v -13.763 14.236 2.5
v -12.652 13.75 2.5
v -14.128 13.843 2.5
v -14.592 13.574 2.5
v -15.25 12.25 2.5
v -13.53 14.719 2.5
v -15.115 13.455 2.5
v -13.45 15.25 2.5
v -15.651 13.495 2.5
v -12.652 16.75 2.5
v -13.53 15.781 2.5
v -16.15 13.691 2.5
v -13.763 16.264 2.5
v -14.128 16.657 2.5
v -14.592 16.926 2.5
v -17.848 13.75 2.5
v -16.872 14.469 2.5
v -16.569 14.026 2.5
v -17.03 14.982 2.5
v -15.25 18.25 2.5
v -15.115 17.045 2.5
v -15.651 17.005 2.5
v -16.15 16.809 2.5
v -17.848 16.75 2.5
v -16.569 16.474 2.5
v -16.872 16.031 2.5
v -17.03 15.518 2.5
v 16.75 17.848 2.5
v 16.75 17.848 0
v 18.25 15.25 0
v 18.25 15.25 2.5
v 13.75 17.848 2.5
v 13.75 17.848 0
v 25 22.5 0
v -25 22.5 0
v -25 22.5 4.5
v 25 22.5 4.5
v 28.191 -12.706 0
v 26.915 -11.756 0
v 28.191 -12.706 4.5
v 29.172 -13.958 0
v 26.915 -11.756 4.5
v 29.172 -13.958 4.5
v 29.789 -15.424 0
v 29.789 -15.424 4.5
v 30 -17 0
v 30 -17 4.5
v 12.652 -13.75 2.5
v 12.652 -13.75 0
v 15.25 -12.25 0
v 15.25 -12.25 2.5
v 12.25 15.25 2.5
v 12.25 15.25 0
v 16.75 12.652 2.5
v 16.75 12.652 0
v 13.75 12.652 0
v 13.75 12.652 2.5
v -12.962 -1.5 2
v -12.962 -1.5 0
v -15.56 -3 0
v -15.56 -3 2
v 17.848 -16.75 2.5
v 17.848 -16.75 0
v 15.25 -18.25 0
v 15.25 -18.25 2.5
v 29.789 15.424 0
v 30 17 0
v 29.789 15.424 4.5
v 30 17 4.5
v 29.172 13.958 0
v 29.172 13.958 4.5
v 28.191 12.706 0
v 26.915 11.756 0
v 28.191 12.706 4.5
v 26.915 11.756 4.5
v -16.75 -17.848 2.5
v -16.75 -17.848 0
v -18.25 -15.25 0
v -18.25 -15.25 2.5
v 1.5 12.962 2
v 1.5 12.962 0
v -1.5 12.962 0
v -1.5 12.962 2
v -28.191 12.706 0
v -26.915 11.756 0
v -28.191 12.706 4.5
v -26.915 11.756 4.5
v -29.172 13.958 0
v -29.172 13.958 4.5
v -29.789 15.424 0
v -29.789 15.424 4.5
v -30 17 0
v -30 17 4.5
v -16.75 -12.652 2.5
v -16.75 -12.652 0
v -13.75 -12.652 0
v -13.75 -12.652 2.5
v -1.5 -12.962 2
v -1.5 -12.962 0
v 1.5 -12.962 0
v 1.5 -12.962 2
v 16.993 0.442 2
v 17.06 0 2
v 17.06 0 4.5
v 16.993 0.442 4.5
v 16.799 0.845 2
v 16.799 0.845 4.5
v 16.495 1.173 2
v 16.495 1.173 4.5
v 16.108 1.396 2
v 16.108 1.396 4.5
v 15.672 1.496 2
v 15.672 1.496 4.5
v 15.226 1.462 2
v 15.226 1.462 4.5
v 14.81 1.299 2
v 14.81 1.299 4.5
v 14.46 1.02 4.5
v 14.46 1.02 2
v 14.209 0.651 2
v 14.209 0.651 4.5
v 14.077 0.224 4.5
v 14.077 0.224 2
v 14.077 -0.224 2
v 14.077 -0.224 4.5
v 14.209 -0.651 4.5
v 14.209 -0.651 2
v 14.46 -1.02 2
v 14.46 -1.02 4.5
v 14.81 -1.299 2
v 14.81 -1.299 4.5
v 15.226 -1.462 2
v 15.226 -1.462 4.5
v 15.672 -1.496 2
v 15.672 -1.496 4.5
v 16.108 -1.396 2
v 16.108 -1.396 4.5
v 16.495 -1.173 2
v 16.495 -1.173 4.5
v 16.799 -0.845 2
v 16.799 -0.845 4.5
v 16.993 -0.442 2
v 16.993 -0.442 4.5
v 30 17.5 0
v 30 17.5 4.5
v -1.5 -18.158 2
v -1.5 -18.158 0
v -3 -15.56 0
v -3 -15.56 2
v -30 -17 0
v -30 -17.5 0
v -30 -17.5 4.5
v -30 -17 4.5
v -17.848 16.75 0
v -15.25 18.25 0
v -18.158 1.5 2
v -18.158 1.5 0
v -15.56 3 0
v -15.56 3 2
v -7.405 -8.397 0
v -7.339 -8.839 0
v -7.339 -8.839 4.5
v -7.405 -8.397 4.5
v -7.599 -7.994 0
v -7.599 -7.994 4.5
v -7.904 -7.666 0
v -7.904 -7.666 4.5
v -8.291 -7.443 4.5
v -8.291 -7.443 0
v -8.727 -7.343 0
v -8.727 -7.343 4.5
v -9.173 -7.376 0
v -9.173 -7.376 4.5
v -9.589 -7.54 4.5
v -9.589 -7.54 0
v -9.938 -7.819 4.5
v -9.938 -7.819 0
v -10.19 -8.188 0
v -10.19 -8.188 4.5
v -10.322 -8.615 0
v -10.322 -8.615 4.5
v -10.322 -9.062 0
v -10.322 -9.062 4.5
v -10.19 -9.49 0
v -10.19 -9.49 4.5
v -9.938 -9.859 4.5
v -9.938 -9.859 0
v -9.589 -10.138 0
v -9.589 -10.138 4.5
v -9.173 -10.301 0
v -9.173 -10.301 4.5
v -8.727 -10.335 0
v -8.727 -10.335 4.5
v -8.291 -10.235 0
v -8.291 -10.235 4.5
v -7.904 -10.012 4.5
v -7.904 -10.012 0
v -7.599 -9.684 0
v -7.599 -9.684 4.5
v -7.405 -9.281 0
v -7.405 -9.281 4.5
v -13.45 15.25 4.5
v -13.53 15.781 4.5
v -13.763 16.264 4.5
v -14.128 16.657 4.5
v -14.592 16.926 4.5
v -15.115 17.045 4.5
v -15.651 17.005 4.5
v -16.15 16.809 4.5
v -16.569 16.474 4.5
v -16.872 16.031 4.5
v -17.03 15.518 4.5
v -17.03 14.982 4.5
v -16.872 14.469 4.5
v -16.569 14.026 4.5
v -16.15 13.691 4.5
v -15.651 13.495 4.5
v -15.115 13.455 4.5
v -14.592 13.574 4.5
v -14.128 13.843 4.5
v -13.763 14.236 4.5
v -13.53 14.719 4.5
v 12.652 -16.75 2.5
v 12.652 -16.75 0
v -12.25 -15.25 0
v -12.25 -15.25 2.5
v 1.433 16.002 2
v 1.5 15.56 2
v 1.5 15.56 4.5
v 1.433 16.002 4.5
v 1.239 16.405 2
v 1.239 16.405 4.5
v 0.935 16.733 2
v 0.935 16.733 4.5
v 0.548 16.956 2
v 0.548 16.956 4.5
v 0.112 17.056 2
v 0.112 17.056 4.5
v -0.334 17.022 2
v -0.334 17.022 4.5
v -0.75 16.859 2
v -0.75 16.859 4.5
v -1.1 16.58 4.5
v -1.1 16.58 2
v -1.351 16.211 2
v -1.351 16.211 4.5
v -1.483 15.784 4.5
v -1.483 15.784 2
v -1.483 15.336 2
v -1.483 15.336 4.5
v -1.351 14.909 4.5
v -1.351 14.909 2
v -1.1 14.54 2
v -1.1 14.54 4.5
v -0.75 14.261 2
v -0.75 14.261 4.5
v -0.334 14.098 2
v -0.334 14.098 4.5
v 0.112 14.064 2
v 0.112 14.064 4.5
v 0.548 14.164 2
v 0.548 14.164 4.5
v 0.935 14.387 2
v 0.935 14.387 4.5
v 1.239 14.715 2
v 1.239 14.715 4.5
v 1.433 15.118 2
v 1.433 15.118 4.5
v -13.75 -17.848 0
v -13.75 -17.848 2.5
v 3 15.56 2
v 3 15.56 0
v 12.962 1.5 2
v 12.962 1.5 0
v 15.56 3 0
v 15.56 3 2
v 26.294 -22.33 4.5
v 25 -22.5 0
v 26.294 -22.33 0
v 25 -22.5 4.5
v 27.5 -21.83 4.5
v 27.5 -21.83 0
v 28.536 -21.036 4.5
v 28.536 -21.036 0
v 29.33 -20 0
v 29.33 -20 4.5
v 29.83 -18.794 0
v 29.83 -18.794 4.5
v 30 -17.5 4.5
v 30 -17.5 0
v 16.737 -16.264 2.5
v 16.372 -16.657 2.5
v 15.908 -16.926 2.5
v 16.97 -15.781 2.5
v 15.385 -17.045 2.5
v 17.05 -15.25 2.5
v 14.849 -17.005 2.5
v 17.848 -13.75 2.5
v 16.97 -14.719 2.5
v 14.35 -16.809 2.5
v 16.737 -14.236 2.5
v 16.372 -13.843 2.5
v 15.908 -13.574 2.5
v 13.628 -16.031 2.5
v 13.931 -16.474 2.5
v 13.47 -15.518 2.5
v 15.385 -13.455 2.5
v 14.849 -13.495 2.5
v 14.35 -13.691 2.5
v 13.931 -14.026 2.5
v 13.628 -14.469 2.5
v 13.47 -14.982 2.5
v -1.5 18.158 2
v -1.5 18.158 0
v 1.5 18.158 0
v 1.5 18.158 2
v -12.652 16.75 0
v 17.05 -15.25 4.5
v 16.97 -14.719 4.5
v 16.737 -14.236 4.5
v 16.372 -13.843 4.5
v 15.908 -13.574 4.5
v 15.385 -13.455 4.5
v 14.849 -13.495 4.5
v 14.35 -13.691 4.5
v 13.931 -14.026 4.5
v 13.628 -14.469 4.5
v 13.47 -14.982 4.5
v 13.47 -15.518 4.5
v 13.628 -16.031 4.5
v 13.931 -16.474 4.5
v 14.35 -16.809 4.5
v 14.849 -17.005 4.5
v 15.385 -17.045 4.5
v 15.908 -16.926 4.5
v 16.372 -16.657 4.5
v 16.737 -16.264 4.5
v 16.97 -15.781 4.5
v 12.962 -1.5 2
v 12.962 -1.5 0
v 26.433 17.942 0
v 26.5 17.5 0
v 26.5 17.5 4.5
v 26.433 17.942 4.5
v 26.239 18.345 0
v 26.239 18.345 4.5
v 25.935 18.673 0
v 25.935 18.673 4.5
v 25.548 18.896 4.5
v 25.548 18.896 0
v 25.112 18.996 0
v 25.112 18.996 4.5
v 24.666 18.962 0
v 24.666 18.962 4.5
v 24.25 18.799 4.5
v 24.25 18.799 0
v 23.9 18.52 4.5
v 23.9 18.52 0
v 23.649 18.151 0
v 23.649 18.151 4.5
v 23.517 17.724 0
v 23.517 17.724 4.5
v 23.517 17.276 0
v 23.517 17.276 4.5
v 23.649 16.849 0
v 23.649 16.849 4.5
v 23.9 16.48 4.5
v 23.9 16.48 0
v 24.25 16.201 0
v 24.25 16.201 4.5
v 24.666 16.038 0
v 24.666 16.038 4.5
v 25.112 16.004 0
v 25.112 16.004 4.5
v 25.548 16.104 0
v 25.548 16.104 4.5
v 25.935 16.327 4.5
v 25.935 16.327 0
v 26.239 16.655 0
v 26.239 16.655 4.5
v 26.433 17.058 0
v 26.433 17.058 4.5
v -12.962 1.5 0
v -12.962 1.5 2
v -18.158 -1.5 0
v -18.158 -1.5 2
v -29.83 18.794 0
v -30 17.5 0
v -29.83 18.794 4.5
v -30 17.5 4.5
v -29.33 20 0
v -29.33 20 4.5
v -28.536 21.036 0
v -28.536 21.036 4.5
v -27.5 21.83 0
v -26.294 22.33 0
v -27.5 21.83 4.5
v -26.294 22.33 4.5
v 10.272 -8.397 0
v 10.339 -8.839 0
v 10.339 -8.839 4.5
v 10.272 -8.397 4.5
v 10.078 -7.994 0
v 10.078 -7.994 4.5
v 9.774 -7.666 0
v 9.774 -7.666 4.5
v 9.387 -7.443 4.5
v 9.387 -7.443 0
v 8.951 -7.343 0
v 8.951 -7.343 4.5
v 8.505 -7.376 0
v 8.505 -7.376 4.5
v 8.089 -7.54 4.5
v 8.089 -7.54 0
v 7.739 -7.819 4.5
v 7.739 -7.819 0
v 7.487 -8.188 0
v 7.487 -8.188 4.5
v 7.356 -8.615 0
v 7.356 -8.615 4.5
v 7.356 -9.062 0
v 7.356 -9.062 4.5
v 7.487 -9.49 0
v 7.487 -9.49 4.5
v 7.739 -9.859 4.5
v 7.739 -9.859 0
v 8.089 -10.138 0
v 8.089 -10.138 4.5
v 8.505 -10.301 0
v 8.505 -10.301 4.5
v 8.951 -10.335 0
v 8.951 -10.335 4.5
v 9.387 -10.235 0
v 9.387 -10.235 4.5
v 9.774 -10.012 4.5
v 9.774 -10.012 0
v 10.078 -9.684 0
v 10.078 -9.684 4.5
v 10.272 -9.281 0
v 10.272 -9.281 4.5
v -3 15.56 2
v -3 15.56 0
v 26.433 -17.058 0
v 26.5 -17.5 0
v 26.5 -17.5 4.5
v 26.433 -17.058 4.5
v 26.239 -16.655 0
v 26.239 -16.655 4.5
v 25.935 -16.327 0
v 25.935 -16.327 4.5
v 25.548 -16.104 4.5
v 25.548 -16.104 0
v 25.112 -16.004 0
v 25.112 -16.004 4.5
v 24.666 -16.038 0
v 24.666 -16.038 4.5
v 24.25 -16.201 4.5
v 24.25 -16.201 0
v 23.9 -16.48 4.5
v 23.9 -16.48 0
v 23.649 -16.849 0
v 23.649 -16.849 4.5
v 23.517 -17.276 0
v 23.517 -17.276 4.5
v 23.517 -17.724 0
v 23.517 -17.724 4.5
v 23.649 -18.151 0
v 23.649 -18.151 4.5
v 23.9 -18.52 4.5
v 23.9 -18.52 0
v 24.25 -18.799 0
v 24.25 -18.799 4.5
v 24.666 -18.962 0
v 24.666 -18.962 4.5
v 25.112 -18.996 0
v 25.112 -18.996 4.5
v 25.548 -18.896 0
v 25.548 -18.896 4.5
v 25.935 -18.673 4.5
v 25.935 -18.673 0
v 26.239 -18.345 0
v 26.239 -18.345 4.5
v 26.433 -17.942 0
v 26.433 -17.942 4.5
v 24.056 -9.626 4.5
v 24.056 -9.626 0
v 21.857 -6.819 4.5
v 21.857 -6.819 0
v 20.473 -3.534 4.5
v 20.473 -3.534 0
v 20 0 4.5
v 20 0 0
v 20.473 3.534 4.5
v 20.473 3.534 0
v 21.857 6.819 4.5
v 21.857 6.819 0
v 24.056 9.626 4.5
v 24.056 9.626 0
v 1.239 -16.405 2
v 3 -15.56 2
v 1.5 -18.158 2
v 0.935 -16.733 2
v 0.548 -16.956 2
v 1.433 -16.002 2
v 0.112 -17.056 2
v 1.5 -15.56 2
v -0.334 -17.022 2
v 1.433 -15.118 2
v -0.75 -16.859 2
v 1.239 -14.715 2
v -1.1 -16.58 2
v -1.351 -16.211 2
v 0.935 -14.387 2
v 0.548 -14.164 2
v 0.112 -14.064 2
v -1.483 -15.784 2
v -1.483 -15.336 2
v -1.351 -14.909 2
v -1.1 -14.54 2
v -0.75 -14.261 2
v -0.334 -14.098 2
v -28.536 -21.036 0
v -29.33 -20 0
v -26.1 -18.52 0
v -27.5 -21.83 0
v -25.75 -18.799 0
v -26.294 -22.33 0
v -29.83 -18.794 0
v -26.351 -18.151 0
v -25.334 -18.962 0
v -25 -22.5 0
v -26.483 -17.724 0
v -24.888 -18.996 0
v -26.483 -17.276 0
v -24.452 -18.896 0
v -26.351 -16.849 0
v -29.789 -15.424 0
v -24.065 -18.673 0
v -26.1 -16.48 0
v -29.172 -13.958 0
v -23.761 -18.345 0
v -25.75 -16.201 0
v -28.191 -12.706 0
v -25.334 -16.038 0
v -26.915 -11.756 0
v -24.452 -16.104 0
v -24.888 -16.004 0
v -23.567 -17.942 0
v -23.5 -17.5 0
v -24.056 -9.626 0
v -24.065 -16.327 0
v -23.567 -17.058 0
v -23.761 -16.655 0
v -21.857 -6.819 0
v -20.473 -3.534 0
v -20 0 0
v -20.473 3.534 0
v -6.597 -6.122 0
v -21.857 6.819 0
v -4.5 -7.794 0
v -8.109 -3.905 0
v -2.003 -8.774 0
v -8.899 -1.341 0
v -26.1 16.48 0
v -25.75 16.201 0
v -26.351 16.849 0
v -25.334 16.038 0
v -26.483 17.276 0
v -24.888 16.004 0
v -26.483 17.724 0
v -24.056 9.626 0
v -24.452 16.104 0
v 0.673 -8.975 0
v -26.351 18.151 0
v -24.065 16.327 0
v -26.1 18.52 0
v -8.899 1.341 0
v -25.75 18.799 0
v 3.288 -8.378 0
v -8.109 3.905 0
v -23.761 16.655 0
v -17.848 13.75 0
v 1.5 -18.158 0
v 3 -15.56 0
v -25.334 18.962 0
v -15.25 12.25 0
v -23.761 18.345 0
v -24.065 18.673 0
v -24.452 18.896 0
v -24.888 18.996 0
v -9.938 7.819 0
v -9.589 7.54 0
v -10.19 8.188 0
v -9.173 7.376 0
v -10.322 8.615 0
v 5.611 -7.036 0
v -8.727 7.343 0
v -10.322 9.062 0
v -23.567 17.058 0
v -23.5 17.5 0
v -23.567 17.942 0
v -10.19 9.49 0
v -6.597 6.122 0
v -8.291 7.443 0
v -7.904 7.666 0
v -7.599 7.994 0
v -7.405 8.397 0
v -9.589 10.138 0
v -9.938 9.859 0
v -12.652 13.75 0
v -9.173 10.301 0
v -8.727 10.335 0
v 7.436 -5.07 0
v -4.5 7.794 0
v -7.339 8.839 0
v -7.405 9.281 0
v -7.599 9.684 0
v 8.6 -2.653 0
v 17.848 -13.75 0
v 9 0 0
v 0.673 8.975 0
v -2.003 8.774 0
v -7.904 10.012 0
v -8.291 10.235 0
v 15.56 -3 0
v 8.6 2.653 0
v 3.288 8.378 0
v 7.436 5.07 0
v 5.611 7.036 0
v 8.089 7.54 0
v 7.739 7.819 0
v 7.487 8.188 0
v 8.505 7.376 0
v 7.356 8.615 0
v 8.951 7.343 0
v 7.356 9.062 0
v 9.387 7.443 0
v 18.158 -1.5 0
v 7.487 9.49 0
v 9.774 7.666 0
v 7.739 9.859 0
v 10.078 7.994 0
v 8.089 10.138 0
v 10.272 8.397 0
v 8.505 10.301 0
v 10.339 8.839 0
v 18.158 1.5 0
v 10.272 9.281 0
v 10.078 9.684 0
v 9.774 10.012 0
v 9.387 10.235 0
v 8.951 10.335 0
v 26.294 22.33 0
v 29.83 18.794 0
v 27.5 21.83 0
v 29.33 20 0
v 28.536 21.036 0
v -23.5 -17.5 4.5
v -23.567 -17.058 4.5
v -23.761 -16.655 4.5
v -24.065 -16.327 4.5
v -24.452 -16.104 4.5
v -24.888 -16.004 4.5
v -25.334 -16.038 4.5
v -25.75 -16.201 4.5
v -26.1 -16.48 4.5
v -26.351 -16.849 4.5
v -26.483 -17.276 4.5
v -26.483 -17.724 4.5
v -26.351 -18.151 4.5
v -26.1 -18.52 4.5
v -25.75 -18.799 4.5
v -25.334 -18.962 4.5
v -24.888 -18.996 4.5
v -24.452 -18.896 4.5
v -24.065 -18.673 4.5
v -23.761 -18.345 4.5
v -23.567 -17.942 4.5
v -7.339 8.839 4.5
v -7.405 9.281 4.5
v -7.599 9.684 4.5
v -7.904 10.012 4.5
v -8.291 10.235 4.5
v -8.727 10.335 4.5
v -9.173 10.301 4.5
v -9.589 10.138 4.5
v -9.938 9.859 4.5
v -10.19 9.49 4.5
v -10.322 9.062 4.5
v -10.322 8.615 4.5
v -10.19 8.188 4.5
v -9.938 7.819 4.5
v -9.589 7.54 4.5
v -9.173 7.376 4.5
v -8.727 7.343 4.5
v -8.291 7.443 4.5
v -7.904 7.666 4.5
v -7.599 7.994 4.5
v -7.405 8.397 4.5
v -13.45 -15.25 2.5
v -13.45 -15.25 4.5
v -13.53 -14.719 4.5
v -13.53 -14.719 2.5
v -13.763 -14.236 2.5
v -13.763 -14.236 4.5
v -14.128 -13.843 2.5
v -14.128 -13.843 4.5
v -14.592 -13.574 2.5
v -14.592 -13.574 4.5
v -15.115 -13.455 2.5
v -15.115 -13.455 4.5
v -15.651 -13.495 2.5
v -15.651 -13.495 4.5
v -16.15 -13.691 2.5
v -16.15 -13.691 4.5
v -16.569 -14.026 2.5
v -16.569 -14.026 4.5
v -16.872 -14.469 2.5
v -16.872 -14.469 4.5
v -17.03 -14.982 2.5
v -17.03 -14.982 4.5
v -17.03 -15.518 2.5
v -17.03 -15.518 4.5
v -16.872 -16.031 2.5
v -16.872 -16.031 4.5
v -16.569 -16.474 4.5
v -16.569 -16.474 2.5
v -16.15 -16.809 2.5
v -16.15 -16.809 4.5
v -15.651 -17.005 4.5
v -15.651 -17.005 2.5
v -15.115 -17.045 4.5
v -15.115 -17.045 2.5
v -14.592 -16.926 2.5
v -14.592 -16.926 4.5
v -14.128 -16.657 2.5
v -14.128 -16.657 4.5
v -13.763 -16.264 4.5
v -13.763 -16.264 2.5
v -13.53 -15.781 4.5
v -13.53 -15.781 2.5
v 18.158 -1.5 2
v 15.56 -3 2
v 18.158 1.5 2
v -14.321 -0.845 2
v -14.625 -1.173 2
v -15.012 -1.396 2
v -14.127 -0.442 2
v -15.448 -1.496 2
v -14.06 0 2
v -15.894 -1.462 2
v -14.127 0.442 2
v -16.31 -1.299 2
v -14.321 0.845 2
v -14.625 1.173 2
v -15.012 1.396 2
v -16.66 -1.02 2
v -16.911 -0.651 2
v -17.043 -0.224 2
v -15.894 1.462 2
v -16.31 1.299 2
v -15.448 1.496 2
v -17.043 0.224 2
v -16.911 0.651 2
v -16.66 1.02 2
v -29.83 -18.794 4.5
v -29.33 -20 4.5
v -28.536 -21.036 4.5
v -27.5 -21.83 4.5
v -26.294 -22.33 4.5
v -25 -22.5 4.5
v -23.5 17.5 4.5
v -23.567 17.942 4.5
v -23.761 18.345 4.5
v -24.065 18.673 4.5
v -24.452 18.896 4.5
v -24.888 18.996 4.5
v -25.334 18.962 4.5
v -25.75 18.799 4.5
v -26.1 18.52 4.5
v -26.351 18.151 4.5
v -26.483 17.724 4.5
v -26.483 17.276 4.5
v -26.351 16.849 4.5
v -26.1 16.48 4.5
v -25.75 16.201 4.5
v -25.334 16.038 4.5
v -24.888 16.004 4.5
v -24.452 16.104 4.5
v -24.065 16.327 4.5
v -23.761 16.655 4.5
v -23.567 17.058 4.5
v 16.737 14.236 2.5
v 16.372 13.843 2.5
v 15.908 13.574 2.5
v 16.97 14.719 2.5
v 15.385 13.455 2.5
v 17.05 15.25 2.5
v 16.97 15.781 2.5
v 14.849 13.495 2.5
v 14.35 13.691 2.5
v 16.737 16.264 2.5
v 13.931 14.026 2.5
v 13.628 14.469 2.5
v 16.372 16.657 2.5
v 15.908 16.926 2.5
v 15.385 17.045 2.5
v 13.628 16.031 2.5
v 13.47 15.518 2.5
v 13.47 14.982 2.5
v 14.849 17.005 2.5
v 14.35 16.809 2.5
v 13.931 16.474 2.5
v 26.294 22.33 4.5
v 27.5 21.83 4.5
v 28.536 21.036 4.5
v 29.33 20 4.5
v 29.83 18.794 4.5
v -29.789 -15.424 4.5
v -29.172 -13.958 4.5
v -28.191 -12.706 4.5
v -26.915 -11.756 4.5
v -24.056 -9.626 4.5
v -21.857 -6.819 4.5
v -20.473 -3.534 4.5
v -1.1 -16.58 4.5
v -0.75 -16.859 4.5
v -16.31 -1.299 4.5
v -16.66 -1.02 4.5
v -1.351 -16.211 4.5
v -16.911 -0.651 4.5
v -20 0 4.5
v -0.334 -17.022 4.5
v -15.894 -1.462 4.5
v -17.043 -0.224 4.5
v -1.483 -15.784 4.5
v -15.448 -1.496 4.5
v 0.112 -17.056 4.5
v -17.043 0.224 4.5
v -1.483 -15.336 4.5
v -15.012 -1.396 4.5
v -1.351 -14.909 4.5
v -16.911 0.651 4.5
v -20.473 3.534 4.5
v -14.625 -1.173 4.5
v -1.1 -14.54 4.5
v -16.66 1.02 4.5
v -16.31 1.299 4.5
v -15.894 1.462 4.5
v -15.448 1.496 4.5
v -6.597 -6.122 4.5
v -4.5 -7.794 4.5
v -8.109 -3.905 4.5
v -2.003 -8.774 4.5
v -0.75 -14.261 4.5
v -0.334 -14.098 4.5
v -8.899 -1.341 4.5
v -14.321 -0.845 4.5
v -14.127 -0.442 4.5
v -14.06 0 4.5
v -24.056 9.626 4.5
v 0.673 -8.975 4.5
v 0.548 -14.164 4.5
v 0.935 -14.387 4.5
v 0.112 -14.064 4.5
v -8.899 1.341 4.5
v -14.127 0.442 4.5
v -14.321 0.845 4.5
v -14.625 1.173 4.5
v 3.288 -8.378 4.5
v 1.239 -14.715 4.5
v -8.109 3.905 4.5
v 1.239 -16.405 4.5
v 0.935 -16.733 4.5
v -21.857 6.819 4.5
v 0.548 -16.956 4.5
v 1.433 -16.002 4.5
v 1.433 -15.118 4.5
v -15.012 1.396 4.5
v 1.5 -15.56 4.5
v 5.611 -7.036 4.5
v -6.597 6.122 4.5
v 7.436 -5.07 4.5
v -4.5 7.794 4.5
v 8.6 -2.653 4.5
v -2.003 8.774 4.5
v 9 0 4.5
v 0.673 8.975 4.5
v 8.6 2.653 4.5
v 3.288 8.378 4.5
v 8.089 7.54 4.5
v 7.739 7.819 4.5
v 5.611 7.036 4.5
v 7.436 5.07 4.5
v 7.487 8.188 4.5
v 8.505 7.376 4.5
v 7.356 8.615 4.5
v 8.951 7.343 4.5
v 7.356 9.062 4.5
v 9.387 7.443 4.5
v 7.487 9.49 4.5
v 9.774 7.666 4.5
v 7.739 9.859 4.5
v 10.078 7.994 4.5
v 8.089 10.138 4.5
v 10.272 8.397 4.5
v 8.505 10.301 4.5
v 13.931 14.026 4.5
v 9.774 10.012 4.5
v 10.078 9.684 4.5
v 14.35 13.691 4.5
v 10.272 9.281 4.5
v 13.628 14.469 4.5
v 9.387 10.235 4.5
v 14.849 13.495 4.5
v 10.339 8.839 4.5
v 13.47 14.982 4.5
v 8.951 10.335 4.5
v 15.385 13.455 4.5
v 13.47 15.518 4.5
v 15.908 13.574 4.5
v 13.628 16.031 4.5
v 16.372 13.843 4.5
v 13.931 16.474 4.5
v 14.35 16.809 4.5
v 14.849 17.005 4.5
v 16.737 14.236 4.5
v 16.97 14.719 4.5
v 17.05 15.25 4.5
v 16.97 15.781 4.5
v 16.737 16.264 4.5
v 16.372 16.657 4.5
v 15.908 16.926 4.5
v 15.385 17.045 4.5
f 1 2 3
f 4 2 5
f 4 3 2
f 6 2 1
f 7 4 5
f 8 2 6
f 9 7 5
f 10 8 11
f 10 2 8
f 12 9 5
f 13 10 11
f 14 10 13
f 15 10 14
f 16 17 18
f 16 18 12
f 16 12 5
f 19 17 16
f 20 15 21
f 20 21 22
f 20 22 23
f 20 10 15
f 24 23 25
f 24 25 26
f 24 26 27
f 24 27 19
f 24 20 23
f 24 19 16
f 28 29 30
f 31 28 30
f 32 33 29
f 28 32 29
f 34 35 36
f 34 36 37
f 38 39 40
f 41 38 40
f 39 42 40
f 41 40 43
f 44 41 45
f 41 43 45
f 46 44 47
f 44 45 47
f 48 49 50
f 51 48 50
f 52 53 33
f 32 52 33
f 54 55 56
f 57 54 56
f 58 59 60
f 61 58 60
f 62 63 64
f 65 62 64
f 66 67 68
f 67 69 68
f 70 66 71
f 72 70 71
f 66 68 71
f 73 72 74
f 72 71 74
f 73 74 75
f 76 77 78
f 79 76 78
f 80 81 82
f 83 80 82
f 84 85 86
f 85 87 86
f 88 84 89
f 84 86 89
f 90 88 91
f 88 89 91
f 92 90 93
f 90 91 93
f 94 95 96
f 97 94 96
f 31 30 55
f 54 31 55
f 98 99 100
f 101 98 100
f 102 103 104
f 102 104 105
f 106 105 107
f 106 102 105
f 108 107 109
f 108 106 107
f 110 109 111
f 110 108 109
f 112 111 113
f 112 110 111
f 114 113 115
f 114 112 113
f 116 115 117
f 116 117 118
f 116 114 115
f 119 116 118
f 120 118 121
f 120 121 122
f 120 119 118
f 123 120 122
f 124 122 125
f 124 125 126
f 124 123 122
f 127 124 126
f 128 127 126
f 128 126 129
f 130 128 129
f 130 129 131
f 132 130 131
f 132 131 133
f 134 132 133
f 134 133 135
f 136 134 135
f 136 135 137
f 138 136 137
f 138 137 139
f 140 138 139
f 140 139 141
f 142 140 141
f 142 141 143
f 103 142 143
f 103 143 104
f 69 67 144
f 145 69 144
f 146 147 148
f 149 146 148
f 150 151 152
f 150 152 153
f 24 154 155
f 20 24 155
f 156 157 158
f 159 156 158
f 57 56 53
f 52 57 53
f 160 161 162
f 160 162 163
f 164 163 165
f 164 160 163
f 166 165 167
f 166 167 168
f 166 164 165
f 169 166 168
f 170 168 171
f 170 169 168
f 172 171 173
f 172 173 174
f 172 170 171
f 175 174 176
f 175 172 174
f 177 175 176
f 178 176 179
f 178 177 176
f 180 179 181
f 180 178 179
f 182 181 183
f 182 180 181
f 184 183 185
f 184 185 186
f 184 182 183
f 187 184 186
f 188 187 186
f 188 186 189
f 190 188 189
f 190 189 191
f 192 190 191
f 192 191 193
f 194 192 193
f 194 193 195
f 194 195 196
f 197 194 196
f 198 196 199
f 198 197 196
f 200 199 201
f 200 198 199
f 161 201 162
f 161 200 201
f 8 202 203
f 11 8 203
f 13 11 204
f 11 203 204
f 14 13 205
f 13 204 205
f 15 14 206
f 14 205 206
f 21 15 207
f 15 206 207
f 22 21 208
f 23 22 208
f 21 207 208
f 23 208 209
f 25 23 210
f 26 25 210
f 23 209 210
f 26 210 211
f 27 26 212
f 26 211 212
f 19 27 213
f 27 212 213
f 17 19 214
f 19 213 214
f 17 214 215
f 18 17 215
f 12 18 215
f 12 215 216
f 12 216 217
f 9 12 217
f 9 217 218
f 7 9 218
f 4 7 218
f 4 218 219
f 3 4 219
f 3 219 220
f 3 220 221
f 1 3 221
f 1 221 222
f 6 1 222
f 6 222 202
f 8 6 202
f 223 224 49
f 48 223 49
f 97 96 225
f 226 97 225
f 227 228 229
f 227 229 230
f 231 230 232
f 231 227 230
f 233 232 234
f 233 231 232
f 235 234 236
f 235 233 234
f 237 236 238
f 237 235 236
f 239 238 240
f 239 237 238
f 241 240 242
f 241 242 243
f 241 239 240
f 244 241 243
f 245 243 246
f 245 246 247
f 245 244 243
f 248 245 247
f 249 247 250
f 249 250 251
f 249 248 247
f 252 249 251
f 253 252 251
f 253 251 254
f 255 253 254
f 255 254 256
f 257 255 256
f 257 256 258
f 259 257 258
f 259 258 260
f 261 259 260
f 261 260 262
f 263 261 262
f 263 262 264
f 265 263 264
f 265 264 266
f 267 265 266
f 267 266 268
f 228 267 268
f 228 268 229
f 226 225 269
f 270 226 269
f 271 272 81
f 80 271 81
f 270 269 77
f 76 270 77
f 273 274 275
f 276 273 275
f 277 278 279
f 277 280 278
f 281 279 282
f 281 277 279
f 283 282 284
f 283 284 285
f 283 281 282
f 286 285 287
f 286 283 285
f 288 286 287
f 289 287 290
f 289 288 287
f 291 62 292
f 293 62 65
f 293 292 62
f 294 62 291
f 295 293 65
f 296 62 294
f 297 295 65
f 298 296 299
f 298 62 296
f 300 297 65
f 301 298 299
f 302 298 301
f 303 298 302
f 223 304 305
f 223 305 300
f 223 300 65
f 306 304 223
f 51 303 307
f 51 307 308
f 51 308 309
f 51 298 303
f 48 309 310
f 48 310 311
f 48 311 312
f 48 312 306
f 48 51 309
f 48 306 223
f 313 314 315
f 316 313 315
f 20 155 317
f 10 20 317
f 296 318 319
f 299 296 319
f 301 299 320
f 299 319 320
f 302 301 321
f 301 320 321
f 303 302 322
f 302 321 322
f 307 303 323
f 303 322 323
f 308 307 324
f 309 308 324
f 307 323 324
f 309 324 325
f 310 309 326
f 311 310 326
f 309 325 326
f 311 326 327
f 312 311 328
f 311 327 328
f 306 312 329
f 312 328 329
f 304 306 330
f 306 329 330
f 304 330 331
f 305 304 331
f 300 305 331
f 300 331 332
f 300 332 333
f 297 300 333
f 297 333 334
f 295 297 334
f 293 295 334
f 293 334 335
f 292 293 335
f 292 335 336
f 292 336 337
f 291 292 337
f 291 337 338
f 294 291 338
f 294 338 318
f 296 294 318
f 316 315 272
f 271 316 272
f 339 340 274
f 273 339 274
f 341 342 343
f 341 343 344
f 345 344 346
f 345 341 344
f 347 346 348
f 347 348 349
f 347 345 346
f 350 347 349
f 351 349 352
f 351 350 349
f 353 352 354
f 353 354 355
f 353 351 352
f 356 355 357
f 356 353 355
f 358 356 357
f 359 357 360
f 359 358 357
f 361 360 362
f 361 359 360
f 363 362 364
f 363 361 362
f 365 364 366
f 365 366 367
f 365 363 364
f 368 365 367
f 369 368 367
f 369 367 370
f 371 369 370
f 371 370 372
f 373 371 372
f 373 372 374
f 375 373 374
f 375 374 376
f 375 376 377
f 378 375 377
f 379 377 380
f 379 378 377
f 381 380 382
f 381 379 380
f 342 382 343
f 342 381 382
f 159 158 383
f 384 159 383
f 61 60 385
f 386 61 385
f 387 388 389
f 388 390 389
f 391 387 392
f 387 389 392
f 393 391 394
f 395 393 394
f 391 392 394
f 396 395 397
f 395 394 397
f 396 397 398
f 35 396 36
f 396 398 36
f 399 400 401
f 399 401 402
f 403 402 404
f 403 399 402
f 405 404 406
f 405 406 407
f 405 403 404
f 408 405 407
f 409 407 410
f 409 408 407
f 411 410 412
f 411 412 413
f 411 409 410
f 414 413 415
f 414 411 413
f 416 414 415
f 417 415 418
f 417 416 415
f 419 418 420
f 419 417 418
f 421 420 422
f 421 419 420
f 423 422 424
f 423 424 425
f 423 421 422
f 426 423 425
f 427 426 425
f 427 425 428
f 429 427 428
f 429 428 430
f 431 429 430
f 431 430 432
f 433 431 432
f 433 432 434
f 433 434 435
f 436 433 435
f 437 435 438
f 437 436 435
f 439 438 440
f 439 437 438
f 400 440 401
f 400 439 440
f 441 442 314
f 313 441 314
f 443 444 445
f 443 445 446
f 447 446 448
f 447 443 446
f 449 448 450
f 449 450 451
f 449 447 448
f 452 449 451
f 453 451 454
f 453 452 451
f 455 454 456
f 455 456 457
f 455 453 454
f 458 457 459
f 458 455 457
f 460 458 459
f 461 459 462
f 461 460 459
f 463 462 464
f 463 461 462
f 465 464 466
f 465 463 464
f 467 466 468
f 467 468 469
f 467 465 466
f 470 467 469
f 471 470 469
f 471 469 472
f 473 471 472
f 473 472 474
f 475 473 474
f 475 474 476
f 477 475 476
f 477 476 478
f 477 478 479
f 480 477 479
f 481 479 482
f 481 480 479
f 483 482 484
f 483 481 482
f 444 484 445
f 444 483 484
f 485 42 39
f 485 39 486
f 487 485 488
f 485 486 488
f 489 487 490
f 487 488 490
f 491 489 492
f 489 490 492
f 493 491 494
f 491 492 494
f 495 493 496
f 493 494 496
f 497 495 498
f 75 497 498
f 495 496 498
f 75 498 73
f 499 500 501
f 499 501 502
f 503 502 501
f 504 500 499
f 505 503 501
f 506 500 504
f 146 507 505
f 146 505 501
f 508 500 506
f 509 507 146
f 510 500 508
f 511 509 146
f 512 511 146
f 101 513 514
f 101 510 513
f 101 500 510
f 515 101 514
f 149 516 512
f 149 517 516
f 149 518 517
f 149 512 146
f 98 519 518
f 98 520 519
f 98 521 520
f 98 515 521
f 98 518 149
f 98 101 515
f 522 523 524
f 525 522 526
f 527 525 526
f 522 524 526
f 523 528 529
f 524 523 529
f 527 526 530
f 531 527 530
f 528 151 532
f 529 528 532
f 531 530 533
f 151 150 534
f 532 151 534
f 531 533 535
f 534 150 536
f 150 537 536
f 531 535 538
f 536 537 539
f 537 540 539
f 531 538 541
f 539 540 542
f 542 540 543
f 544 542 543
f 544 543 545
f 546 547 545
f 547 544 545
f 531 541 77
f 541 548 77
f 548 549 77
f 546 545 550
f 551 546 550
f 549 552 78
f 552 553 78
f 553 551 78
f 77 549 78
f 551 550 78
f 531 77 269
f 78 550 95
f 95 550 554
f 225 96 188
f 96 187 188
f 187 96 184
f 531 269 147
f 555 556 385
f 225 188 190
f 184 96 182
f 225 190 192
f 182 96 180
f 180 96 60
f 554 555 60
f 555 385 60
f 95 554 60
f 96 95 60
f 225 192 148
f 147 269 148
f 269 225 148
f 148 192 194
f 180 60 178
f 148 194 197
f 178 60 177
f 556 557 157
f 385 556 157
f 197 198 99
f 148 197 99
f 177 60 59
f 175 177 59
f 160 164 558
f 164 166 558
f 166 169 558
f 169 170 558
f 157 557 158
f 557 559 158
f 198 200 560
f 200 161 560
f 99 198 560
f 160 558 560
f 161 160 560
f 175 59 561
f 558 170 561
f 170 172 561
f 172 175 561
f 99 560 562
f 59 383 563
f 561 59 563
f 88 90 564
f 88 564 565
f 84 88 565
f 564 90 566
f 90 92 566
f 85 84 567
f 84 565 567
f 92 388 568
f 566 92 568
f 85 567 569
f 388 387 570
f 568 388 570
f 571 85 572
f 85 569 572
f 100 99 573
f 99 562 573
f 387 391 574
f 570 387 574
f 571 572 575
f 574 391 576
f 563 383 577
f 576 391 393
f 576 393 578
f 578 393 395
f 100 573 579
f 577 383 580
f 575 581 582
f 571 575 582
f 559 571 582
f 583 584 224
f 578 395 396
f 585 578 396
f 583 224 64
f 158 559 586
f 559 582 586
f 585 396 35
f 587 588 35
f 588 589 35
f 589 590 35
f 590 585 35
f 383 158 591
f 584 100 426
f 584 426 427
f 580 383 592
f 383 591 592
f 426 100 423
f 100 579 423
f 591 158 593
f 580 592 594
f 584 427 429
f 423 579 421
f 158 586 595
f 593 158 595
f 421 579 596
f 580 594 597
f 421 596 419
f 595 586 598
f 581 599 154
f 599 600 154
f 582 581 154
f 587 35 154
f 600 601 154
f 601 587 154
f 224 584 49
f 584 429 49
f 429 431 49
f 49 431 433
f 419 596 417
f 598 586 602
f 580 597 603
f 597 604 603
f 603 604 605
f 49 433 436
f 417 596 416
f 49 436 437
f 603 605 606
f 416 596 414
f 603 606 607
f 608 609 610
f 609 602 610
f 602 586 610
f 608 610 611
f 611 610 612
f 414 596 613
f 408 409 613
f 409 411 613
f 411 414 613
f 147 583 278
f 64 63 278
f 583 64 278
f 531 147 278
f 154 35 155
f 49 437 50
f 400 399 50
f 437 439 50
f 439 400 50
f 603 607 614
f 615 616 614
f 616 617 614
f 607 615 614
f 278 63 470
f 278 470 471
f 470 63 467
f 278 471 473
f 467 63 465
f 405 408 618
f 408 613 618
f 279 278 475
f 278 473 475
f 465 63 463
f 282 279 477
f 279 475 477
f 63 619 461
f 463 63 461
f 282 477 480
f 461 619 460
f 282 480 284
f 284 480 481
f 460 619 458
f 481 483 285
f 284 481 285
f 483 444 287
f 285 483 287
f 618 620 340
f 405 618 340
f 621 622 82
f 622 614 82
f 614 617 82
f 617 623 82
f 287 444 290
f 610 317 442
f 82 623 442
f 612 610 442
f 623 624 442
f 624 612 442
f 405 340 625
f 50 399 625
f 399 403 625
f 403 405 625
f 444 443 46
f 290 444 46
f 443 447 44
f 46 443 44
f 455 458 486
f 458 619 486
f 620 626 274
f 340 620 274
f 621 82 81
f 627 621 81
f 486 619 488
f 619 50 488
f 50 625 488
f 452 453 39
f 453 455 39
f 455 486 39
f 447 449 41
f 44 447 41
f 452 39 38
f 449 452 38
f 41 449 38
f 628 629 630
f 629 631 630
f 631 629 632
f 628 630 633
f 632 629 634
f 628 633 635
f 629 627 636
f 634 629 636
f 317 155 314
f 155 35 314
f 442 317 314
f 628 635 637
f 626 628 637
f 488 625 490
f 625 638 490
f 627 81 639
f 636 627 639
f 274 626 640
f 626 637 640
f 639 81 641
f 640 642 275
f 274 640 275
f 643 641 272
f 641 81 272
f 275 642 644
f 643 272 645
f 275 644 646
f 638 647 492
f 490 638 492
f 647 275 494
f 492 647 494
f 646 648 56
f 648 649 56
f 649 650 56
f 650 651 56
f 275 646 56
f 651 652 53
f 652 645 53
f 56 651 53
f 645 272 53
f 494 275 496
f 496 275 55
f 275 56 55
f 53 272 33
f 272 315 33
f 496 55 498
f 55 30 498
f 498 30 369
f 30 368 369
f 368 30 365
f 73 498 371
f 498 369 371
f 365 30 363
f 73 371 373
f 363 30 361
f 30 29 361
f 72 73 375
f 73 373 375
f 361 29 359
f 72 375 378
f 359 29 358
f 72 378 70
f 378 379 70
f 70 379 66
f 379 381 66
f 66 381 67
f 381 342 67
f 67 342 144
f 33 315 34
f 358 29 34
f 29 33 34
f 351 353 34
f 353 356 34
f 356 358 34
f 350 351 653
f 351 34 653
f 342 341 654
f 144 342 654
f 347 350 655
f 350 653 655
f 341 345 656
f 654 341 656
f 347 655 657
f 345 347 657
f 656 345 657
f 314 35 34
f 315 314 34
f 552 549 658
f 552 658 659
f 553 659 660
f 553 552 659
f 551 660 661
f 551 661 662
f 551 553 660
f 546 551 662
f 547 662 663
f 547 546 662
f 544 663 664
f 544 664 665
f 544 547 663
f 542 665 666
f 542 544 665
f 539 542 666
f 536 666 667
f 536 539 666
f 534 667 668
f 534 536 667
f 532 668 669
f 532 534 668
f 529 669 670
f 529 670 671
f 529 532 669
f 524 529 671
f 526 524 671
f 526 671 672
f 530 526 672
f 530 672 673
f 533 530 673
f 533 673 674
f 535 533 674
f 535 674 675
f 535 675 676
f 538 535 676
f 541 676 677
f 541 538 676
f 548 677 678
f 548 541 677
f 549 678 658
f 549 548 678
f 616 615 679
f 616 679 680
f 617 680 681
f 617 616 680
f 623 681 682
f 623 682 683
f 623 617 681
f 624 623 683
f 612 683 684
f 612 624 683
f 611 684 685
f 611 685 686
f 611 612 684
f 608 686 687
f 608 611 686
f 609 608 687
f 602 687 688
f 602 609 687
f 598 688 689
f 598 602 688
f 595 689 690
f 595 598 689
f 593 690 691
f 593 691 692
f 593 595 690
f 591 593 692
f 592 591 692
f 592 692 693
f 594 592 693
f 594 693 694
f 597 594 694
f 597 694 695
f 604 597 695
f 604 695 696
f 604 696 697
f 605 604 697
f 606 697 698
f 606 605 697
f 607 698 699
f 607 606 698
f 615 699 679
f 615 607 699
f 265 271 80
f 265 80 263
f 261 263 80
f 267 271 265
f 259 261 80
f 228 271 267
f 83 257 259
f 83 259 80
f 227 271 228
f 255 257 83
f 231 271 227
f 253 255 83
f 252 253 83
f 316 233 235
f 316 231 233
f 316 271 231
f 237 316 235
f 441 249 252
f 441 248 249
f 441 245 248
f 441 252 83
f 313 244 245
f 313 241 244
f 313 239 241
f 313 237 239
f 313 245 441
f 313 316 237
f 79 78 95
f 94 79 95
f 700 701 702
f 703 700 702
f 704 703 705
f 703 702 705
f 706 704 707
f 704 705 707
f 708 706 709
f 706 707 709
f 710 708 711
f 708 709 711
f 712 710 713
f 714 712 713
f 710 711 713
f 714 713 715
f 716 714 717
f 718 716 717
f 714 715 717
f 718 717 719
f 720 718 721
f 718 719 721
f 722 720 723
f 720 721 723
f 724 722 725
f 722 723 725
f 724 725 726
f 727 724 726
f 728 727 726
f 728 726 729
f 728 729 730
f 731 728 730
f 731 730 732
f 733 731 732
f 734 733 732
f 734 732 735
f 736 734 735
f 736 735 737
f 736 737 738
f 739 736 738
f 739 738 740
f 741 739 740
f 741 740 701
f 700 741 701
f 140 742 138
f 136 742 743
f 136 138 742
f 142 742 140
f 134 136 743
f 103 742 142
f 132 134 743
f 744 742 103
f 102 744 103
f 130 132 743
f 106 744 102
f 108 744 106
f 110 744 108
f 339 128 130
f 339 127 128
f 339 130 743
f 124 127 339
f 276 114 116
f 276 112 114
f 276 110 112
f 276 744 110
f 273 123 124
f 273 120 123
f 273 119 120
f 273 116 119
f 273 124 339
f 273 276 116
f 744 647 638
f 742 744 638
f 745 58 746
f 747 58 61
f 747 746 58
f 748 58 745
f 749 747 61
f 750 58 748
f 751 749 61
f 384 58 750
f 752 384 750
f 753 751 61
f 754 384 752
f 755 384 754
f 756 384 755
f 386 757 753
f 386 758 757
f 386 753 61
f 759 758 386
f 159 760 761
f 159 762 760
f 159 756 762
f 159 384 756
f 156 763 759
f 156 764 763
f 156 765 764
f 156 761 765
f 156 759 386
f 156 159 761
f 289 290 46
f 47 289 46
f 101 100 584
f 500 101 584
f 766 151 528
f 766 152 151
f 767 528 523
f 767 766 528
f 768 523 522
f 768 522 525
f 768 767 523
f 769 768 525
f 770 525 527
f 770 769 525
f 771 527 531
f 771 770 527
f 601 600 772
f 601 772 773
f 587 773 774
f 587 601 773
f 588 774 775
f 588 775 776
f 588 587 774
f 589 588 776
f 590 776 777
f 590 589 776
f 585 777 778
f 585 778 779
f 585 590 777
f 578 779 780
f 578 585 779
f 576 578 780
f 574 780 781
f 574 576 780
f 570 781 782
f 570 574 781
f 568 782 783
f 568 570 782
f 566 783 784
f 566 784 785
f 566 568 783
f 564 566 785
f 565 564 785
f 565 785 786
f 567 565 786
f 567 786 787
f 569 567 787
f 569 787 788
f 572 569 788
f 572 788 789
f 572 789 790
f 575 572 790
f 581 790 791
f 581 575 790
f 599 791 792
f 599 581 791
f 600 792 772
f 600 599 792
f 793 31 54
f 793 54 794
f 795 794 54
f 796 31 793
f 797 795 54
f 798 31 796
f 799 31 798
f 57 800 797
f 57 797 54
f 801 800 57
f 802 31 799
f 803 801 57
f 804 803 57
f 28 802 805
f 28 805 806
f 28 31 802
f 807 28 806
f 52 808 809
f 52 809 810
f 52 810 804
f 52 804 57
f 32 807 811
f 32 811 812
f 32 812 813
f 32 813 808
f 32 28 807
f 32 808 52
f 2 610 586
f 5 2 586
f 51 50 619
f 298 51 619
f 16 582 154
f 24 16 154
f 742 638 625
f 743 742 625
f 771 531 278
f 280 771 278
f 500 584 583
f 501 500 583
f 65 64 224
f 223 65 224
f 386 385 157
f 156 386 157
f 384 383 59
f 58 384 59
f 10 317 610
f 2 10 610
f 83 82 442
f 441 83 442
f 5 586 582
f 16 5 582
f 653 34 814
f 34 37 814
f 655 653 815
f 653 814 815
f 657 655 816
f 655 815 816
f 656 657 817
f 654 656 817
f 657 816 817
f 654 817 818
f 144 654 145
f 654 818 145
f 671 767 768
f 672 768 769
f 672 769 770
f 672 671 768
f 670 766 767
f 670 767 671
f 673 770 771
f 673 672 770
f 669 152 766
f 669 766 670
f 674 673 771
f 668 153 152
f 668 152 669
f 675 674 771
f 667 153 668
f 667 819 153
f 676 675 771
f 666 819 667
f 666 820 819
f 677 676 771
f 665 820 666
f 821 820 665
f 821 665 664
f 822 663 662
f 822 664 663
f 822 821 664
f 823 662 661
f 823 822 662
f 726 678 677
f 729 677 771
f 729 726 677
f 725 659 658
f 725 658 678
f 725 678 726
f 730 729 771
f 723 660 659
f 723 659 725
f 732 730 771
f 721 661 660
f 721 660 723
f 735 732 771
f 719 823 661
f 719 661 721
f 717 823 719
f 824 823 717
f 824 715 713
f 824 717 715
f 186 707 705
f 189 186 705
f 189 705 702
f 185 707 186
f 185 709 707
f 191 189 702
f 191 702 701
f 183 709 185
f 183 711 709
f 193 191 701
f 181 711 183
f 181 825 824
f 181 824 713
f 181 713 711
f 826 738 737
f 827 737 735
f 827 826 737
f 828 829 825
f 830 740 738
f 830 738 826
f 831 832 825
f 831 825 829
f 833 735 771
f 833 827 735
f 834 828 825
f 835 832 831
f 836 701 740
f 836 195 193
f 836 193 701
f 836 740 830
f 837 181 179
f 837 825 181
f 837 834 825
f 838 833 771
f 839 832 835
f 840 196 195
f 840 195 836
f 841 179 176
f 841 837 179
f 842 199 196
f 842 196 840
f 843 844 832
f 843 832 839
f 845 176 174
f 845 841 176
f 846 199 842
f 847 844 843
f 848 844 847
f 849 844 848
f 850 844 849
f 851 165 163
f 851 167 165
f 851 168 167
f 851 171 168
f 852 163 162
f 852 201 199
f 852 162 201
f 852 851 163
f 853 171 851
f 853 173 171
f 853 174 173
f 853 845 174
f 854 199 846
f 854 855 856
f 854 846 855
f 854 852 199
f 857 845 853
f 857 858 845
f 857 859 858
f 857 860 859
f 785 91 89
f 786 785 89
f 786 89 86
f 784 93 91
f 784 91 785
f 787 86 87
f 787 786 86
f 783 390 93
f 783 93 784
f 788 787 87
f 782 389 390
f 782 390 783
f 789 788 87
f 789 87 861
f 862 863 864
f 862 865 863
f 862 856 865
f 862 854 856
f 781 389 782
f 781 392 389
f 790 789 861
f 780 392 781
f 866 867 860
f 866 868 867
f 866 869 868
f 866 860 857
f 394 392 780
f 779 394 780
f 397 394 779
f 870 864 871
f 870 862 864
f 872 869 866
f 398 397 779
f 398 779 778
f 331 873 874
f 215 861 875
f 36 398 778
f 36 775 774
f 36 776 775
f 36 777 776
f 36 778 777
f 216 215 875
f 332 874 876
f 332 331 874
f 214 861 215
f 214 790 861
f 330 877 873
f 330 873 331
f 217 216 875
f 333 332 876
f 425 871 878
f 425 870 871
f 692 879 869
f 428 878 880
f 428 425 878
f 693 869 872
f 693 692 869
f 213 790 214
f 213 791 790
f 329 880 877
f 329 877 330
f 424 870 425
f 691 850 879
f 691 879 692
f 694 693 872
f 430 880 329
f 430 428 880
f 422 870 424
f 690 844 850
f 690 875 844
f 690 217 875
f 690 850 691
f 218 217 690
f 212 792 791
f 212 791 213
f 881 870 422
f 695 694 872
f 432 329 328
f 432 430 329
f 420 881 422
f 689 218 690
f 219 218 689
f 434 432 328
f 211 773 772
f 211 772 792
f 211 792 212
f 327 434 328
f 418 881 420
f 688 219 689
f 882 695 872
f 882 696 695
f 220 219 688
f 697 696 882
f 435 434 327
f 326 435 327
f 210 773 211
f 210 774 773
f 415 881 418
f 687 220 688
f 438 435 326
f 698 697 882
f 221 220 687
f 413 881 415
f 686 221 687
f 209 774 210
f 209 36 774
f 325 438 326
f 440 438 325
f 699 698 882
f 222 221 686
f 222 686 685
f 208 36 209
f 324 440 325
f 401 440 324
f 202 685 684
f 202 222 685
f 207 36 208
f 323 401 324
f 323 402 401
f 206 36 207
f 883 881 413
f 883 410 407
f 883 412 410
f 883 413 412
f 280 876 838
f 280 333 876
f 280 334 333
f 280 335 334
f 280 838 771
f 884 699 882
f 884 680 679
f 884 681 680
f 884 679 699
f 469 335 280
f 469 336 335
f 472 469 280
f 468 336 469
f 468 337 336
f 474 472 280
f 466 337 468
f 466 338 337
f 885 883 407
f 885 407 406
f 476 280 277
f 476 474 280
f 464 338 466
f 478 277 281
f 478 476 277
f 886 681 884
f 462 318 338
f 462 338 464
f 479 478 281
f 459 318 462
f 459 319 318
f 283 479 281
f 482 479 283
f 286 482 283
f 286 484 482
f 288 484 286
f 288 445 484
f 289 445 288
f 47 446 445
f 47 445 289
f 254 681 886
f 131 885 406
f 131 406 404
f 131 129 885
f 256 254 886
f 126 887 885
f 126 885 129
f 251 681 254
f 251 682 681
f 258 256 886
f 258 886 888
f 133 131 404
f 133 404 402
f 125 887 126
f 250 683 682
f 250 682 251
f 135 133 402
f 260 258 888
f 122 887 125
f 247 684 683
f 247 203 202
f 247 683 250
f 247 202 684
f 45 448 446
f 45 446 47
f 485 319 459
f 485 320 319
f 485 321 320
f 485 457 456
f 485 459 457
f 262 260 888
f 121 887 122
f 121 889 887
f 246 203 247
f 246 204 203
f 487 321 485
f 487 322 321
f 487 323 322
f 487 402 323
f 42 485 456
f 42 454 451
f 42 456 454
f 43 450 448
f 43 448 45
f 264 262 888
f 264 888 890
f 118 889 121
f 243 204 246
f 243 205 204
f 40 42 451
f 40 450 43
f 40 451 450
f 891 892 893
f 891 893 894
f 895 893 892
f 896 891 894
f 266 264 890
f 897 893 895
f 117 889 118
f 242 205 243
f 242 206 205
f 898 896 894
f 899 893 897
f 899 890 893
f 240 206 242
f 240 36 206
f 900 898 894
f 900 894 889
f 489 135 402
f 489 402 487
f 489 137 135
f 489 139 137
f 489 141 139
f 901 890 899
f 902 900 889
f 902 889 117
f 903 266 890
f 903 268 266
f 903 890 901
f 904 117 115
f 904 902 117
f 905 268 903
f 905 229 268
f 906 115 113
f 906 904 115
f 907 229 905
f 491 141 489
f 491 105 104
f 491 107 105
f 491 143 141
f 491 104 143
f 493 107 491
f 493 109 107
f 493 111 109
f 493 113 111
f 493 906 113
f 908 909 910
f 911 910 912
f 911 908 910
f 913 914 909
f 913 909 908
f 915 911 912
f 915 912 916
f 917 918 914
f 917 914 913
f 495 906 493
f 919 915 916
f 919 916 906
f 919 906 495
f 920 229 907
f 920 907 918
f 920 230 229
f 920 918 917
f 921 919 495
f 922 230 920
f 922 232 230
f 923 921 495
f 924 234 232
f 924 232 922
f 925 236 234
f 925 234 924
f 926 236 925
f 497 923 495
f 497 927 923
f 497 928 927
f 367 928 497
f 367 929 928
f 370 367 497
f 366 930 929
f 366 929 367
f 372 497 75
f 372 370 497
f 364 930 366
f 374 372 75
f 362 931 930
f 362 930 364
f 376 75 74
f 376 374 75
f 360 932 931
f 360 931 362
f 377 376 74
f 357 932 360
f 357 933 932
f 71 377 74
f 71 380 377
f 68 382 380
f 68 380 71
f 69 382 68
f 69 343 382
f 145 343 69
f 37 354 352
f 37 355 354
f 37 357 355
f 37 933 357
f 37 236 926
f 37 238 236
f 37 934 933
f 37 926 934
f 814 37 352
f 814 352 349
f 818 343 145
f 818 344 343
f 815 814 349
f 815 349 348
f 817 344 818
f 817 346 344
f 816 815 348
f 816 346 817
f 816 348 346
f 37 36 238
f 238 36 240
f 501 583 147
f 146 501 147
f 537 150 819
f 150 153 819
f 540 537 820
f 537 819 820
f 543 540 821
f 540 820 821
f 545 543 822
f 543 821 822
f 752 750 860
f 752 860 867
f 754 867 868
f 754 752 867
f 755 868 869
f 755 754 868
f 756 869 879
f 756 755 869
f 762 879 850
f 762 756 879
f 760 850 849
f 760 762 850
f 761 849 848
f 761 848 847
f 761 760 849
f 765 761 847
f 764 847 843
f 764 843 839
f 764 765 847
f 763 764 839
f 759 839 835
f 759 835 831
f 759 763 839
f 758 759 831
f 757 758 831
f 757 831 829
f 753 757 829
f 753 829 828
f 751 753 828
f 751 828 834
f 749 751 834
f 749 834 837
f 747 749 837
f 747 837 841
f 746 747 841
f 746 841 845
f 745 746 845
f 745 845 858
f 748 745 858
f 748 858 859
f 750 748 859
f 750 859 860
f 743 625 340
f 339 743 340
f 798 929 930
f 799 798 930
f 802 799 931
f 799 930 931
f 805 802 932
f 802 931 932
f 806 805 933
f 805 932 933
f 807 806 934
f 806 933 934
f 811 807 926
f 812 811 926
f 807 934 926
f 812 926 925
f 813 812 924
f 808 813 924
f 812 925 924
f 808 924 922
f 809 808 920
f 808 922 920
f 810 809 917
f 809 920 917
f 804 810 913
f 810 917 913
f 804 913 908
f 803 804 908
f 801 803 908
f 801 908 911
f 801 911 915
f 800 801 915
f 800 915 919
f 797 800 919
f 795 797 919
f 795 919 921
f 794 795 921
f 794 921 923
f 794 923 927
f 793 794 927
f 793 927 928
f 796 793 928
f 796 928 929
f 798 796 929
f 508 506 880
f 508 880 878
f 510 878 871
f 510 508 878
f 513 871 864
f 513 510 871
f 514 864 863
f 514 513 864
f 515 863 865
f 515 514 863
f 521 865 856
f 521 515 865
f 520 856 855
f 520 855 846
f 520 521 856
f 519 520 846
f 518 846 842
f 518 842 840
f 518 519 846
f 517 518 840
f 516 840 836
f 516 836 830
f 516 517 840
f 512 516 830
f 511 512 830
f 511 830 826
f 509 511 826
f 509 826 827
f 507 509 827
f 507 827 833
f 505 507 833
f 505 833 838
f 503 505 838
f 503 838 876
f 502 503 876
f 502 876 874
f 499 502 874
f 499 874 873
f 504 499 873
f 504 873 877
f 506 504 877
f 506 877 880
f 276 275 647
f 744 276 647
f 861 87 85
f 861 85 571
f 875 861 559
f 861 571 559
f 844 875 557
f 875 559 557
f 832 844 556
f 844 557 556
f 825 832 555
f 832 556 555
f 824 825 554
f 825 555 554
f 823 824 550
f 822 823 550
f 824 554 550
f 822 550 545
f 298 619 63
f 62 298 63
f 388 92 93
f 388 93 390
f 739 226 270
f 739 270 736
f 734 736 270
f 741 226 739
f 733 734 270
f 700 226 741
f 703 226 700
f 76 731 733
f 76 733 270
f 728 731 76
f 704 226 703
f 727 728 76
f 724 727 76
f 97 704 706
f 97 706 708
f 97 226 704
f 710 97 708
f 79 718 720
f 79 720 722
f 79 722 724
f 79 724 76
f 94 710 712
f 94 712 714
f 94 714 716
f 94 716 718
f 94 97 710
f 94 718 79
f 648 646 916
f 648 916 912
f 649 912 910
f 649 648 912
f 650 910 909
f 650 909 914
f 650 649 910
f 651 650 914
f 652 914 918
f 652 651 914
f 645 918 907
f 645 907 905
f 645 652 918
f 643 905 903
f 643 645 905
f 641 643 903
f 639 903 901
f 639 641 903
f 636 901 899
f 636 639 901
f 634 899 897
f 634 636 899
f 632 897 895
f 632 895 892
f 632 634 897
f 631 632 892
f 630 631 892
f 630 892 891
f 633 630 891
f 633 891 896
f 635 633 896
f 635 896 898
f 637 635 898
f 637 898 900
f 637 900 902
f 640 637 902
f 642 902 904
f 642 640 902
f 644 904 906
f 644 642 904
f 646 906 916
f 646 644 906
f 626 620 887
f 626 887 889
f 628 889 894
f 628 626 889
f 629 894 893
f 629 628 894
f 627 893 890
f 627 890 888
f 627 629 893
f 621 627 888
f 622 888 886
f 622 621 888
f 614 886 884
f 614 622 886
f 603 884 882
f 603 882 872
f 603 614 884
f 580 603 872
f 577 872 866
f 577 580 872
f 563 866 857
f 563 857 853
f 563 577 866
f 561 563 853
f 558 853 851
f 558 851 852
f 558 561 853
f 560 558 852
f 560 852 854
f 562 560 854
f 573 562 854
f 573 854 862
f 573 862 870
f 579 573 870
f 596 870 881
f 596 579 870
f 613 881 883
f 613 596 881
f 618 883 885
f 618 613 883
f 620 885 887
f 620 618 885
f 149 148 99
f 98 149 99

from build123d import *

# Parameters (mm, degrees)
SKETCH_1_W          = 60
SKETCH_1_H          = 45
SKETCH_1_R          = 1.5
SKETCH_1_R_2        = 9
EXTRUDE_1_DEPTH     = 4.5
CUT_EXTRUDE_1_DEPTH = 2
FILLET_1_R          = 5
SKETCH_4_R          = 1.8
CUT_EXTRUDE_2_DEPTH = 4.5
CUT_EXTRUDE_3_DEPTH = 2.5
CUT_EXTRUDE_4_DEPTH = 4.5
FILLET_2_R          = 6


with BuildPart() as part:
    # 草图1 → 凸台-拉伸1 (new body)
    with BuildSketch(Plane.XY):
        Rectangle(SKETCH_1_W, SKETCH_1_H)
        with Locations((8.838834765, 8.838834765)):
            Circle(SKETCH_1_R, mode=Mode.SUBTRACT)
        Circle(SKETCH_1_R_2, mode=Mode.SUBTRACT)
        with Locations((8.838834765, -8.838834765)):
            Circle(SKETCH_1_R, mode=Mode.SUBTRACT)
        with Locations((-8.838834765, -8.838834765)):
            Circle(SKETCH_1_R, mode=Mode.SUBTRACT)
        with Locations((-8.838834765, 8.838834765)):
            Circle(SKETCH_1_R, mode=Mode.SUBTRACT)
        with Locations((0, -15.56)):
            Circle(SKETCH_1_R, mode=Mode.SUBTRACT)
        with Locations((-15.56, 0)):
            Circle(SKETCH_1_R, mode=Mode.SUBTRACT)
        with Locations((0, 15.56)):
            Circle(SKETCH_1_R, mode=Mode.SUBTRACT)
        with Locations((15.56, 0)):
            Circle(SKETCH_1_R, mode=Mode.SUBTRACT)
        with Locations((-25, 17.5)):
            Circle(SKETCH_1_R, mode=Mode.SUBTRACT)
        with Locations((25, 17.5)):
            Circle(SKETCH_1_R, mode=Mode.SUBTRACT)
        with Locations((25, -17.5)):
            Circle(SKETCH_1_R, mode=Mode.SUBTRACT)
        with Locations((-25, -17.5)):
            Circle(SKETCH_1_R, mode=Mode.SUBTRACT)
    extrude(amount=EXTRUDE_1_DEPTH)

    # 草图2 → 切除-拉伸1 (cut)
    with BuildSketch(Plane(origin=(0, 0, 0), x_dir=(-1, 0, 0), z_dir=(0, 0, -1))):
        Polygon((-1.5, -12.961923789), (-3, -15.56), (-1.5, -18.158076211), (1.5, -18.158076211), (3, -15.56), (1.5, -12.961923789), align=None)
        Polygon((12.961923789, -1.5), (15.56, -3), (18.158076211, -1.5), (18.158076211, 1.5), (15.56, 3), (12.961923789, 1.5), align=None)
        Polygon((-12.961923789, 1.5), (-15.56, 3), (-18.158076211, 1.5), (-18.158076211, -1.5), (-15.56, -3), (-12.961923789, -1.5), align=None)
        Polygon((1.5, 12.961923789), (3, 15.56), (1.5, 18.158076211), (-1.5, 18.158076211), (-3, 15.56), (-1.5, 12.961923789), align=None)
    extrude(amount=-CUT_EXTRUDE_1_DEPTH, mode=Mode.SUBTRACT)

    # 圆角1
    fillet_1_edges = [part.edges().sort_by_distance(p)[0] for p in [
        (30, -22.5, 2.25),
        (-30, -22.5, 2.25),
        (-30, 22.5, 2.25),
        (30, 22.5, 2.25),
    ]]
    fillet(fillet_1_edges, radius=FILLET_1_R)

    # 草图4 → 切除-拉伸2 (cut)
    with BuildSketch(Plane.XY.offset(4.5)):
        with Locations((-15.25, 15.25)):
            Circle(SKETCH_4_R)
        with Locations((15.25, 15.25)):
            Circle(SKETCH_4_R)
        with Locations((15.25, -15.25)):
            Circle(SKETCH_4_R)
        with Locations((-15.25, -15.25)):
            Circle(SKETCH_4_R)
    extrude(amount=-CUT_EXTRUDE_2_DEPTH, mode=Mode.SUBTRACT)

    # 草图5 → 切除-拉伸3 (cut)
    with BuildSketch(Plane(origin=(0, 0, 0), x_dir=(-1, 0, 0), z_dir=(0, 0, -1))):
        Polygon((12.651923789, 13.75), (15.25, 12.25), (17.848076211, 13.75), (17.848076211, 16.75), (15.25, 18.25), (12.651923789, 16.75), align=None)
        Polygon((-13.75, 12.651923789), (-12.25, 15.25), (-13.75, 17.848076211), (-16.75, 17.848076211), (-18.25, 15.25), (-16.75, 12.651923789), align=None)
        Polygon((13.75, -12.651923789), (12.25, -15.25), (13.75, -17.848076211), (16.75, -17.848076211), (18.25, -15.25), (16.75, -12.651923789), align=None)
        Polygon((-12.651923789, -13.75), (-15.25, -12.25), (-17.848076211, -13.75), (-17.848076211, -16.75), (-15.25, -18.25), (-12.651923789, -16.75), align=None)
    extrude(amount=-CUT_EXTRUDE_3_DEPTH, mode=Mode.SUBTRACT)

    # 草图6 → 切除-拉伸4 (cut)
    with BuildSketch(Plane(origin=(0, 0, 0), x_dir=(-1, 0, 0), z_dir=(0, 0, -1))):
        with BuildLine():
            Line((-30, 13), (-30, -13))
            ThreePointArc((-30, -13), (-20, 0), (-30, 13))
        make_face()
        with BuildLine():
            Line((30, -13), (30, 13))
            ThreePointArc((30, 13), (20, 0), (30, -13))
        make_face()
    extrude(amount=-CUT_EXTRUDE_4_DEPTH, mode=Mode.SUBTRACT)

    # 圆角2
    fillet_2_edges = [part.edges().sort_by_distance(p)[0] for p in [
        (30, -13, 2.25),
        (30, 13, 2.25),
        (-30, 13, 2.25),
        (-30, -13, 2.25),
    ]]
    fillet(fillet_2_edges, radius=FILLET_2_R)


solid = part.part
